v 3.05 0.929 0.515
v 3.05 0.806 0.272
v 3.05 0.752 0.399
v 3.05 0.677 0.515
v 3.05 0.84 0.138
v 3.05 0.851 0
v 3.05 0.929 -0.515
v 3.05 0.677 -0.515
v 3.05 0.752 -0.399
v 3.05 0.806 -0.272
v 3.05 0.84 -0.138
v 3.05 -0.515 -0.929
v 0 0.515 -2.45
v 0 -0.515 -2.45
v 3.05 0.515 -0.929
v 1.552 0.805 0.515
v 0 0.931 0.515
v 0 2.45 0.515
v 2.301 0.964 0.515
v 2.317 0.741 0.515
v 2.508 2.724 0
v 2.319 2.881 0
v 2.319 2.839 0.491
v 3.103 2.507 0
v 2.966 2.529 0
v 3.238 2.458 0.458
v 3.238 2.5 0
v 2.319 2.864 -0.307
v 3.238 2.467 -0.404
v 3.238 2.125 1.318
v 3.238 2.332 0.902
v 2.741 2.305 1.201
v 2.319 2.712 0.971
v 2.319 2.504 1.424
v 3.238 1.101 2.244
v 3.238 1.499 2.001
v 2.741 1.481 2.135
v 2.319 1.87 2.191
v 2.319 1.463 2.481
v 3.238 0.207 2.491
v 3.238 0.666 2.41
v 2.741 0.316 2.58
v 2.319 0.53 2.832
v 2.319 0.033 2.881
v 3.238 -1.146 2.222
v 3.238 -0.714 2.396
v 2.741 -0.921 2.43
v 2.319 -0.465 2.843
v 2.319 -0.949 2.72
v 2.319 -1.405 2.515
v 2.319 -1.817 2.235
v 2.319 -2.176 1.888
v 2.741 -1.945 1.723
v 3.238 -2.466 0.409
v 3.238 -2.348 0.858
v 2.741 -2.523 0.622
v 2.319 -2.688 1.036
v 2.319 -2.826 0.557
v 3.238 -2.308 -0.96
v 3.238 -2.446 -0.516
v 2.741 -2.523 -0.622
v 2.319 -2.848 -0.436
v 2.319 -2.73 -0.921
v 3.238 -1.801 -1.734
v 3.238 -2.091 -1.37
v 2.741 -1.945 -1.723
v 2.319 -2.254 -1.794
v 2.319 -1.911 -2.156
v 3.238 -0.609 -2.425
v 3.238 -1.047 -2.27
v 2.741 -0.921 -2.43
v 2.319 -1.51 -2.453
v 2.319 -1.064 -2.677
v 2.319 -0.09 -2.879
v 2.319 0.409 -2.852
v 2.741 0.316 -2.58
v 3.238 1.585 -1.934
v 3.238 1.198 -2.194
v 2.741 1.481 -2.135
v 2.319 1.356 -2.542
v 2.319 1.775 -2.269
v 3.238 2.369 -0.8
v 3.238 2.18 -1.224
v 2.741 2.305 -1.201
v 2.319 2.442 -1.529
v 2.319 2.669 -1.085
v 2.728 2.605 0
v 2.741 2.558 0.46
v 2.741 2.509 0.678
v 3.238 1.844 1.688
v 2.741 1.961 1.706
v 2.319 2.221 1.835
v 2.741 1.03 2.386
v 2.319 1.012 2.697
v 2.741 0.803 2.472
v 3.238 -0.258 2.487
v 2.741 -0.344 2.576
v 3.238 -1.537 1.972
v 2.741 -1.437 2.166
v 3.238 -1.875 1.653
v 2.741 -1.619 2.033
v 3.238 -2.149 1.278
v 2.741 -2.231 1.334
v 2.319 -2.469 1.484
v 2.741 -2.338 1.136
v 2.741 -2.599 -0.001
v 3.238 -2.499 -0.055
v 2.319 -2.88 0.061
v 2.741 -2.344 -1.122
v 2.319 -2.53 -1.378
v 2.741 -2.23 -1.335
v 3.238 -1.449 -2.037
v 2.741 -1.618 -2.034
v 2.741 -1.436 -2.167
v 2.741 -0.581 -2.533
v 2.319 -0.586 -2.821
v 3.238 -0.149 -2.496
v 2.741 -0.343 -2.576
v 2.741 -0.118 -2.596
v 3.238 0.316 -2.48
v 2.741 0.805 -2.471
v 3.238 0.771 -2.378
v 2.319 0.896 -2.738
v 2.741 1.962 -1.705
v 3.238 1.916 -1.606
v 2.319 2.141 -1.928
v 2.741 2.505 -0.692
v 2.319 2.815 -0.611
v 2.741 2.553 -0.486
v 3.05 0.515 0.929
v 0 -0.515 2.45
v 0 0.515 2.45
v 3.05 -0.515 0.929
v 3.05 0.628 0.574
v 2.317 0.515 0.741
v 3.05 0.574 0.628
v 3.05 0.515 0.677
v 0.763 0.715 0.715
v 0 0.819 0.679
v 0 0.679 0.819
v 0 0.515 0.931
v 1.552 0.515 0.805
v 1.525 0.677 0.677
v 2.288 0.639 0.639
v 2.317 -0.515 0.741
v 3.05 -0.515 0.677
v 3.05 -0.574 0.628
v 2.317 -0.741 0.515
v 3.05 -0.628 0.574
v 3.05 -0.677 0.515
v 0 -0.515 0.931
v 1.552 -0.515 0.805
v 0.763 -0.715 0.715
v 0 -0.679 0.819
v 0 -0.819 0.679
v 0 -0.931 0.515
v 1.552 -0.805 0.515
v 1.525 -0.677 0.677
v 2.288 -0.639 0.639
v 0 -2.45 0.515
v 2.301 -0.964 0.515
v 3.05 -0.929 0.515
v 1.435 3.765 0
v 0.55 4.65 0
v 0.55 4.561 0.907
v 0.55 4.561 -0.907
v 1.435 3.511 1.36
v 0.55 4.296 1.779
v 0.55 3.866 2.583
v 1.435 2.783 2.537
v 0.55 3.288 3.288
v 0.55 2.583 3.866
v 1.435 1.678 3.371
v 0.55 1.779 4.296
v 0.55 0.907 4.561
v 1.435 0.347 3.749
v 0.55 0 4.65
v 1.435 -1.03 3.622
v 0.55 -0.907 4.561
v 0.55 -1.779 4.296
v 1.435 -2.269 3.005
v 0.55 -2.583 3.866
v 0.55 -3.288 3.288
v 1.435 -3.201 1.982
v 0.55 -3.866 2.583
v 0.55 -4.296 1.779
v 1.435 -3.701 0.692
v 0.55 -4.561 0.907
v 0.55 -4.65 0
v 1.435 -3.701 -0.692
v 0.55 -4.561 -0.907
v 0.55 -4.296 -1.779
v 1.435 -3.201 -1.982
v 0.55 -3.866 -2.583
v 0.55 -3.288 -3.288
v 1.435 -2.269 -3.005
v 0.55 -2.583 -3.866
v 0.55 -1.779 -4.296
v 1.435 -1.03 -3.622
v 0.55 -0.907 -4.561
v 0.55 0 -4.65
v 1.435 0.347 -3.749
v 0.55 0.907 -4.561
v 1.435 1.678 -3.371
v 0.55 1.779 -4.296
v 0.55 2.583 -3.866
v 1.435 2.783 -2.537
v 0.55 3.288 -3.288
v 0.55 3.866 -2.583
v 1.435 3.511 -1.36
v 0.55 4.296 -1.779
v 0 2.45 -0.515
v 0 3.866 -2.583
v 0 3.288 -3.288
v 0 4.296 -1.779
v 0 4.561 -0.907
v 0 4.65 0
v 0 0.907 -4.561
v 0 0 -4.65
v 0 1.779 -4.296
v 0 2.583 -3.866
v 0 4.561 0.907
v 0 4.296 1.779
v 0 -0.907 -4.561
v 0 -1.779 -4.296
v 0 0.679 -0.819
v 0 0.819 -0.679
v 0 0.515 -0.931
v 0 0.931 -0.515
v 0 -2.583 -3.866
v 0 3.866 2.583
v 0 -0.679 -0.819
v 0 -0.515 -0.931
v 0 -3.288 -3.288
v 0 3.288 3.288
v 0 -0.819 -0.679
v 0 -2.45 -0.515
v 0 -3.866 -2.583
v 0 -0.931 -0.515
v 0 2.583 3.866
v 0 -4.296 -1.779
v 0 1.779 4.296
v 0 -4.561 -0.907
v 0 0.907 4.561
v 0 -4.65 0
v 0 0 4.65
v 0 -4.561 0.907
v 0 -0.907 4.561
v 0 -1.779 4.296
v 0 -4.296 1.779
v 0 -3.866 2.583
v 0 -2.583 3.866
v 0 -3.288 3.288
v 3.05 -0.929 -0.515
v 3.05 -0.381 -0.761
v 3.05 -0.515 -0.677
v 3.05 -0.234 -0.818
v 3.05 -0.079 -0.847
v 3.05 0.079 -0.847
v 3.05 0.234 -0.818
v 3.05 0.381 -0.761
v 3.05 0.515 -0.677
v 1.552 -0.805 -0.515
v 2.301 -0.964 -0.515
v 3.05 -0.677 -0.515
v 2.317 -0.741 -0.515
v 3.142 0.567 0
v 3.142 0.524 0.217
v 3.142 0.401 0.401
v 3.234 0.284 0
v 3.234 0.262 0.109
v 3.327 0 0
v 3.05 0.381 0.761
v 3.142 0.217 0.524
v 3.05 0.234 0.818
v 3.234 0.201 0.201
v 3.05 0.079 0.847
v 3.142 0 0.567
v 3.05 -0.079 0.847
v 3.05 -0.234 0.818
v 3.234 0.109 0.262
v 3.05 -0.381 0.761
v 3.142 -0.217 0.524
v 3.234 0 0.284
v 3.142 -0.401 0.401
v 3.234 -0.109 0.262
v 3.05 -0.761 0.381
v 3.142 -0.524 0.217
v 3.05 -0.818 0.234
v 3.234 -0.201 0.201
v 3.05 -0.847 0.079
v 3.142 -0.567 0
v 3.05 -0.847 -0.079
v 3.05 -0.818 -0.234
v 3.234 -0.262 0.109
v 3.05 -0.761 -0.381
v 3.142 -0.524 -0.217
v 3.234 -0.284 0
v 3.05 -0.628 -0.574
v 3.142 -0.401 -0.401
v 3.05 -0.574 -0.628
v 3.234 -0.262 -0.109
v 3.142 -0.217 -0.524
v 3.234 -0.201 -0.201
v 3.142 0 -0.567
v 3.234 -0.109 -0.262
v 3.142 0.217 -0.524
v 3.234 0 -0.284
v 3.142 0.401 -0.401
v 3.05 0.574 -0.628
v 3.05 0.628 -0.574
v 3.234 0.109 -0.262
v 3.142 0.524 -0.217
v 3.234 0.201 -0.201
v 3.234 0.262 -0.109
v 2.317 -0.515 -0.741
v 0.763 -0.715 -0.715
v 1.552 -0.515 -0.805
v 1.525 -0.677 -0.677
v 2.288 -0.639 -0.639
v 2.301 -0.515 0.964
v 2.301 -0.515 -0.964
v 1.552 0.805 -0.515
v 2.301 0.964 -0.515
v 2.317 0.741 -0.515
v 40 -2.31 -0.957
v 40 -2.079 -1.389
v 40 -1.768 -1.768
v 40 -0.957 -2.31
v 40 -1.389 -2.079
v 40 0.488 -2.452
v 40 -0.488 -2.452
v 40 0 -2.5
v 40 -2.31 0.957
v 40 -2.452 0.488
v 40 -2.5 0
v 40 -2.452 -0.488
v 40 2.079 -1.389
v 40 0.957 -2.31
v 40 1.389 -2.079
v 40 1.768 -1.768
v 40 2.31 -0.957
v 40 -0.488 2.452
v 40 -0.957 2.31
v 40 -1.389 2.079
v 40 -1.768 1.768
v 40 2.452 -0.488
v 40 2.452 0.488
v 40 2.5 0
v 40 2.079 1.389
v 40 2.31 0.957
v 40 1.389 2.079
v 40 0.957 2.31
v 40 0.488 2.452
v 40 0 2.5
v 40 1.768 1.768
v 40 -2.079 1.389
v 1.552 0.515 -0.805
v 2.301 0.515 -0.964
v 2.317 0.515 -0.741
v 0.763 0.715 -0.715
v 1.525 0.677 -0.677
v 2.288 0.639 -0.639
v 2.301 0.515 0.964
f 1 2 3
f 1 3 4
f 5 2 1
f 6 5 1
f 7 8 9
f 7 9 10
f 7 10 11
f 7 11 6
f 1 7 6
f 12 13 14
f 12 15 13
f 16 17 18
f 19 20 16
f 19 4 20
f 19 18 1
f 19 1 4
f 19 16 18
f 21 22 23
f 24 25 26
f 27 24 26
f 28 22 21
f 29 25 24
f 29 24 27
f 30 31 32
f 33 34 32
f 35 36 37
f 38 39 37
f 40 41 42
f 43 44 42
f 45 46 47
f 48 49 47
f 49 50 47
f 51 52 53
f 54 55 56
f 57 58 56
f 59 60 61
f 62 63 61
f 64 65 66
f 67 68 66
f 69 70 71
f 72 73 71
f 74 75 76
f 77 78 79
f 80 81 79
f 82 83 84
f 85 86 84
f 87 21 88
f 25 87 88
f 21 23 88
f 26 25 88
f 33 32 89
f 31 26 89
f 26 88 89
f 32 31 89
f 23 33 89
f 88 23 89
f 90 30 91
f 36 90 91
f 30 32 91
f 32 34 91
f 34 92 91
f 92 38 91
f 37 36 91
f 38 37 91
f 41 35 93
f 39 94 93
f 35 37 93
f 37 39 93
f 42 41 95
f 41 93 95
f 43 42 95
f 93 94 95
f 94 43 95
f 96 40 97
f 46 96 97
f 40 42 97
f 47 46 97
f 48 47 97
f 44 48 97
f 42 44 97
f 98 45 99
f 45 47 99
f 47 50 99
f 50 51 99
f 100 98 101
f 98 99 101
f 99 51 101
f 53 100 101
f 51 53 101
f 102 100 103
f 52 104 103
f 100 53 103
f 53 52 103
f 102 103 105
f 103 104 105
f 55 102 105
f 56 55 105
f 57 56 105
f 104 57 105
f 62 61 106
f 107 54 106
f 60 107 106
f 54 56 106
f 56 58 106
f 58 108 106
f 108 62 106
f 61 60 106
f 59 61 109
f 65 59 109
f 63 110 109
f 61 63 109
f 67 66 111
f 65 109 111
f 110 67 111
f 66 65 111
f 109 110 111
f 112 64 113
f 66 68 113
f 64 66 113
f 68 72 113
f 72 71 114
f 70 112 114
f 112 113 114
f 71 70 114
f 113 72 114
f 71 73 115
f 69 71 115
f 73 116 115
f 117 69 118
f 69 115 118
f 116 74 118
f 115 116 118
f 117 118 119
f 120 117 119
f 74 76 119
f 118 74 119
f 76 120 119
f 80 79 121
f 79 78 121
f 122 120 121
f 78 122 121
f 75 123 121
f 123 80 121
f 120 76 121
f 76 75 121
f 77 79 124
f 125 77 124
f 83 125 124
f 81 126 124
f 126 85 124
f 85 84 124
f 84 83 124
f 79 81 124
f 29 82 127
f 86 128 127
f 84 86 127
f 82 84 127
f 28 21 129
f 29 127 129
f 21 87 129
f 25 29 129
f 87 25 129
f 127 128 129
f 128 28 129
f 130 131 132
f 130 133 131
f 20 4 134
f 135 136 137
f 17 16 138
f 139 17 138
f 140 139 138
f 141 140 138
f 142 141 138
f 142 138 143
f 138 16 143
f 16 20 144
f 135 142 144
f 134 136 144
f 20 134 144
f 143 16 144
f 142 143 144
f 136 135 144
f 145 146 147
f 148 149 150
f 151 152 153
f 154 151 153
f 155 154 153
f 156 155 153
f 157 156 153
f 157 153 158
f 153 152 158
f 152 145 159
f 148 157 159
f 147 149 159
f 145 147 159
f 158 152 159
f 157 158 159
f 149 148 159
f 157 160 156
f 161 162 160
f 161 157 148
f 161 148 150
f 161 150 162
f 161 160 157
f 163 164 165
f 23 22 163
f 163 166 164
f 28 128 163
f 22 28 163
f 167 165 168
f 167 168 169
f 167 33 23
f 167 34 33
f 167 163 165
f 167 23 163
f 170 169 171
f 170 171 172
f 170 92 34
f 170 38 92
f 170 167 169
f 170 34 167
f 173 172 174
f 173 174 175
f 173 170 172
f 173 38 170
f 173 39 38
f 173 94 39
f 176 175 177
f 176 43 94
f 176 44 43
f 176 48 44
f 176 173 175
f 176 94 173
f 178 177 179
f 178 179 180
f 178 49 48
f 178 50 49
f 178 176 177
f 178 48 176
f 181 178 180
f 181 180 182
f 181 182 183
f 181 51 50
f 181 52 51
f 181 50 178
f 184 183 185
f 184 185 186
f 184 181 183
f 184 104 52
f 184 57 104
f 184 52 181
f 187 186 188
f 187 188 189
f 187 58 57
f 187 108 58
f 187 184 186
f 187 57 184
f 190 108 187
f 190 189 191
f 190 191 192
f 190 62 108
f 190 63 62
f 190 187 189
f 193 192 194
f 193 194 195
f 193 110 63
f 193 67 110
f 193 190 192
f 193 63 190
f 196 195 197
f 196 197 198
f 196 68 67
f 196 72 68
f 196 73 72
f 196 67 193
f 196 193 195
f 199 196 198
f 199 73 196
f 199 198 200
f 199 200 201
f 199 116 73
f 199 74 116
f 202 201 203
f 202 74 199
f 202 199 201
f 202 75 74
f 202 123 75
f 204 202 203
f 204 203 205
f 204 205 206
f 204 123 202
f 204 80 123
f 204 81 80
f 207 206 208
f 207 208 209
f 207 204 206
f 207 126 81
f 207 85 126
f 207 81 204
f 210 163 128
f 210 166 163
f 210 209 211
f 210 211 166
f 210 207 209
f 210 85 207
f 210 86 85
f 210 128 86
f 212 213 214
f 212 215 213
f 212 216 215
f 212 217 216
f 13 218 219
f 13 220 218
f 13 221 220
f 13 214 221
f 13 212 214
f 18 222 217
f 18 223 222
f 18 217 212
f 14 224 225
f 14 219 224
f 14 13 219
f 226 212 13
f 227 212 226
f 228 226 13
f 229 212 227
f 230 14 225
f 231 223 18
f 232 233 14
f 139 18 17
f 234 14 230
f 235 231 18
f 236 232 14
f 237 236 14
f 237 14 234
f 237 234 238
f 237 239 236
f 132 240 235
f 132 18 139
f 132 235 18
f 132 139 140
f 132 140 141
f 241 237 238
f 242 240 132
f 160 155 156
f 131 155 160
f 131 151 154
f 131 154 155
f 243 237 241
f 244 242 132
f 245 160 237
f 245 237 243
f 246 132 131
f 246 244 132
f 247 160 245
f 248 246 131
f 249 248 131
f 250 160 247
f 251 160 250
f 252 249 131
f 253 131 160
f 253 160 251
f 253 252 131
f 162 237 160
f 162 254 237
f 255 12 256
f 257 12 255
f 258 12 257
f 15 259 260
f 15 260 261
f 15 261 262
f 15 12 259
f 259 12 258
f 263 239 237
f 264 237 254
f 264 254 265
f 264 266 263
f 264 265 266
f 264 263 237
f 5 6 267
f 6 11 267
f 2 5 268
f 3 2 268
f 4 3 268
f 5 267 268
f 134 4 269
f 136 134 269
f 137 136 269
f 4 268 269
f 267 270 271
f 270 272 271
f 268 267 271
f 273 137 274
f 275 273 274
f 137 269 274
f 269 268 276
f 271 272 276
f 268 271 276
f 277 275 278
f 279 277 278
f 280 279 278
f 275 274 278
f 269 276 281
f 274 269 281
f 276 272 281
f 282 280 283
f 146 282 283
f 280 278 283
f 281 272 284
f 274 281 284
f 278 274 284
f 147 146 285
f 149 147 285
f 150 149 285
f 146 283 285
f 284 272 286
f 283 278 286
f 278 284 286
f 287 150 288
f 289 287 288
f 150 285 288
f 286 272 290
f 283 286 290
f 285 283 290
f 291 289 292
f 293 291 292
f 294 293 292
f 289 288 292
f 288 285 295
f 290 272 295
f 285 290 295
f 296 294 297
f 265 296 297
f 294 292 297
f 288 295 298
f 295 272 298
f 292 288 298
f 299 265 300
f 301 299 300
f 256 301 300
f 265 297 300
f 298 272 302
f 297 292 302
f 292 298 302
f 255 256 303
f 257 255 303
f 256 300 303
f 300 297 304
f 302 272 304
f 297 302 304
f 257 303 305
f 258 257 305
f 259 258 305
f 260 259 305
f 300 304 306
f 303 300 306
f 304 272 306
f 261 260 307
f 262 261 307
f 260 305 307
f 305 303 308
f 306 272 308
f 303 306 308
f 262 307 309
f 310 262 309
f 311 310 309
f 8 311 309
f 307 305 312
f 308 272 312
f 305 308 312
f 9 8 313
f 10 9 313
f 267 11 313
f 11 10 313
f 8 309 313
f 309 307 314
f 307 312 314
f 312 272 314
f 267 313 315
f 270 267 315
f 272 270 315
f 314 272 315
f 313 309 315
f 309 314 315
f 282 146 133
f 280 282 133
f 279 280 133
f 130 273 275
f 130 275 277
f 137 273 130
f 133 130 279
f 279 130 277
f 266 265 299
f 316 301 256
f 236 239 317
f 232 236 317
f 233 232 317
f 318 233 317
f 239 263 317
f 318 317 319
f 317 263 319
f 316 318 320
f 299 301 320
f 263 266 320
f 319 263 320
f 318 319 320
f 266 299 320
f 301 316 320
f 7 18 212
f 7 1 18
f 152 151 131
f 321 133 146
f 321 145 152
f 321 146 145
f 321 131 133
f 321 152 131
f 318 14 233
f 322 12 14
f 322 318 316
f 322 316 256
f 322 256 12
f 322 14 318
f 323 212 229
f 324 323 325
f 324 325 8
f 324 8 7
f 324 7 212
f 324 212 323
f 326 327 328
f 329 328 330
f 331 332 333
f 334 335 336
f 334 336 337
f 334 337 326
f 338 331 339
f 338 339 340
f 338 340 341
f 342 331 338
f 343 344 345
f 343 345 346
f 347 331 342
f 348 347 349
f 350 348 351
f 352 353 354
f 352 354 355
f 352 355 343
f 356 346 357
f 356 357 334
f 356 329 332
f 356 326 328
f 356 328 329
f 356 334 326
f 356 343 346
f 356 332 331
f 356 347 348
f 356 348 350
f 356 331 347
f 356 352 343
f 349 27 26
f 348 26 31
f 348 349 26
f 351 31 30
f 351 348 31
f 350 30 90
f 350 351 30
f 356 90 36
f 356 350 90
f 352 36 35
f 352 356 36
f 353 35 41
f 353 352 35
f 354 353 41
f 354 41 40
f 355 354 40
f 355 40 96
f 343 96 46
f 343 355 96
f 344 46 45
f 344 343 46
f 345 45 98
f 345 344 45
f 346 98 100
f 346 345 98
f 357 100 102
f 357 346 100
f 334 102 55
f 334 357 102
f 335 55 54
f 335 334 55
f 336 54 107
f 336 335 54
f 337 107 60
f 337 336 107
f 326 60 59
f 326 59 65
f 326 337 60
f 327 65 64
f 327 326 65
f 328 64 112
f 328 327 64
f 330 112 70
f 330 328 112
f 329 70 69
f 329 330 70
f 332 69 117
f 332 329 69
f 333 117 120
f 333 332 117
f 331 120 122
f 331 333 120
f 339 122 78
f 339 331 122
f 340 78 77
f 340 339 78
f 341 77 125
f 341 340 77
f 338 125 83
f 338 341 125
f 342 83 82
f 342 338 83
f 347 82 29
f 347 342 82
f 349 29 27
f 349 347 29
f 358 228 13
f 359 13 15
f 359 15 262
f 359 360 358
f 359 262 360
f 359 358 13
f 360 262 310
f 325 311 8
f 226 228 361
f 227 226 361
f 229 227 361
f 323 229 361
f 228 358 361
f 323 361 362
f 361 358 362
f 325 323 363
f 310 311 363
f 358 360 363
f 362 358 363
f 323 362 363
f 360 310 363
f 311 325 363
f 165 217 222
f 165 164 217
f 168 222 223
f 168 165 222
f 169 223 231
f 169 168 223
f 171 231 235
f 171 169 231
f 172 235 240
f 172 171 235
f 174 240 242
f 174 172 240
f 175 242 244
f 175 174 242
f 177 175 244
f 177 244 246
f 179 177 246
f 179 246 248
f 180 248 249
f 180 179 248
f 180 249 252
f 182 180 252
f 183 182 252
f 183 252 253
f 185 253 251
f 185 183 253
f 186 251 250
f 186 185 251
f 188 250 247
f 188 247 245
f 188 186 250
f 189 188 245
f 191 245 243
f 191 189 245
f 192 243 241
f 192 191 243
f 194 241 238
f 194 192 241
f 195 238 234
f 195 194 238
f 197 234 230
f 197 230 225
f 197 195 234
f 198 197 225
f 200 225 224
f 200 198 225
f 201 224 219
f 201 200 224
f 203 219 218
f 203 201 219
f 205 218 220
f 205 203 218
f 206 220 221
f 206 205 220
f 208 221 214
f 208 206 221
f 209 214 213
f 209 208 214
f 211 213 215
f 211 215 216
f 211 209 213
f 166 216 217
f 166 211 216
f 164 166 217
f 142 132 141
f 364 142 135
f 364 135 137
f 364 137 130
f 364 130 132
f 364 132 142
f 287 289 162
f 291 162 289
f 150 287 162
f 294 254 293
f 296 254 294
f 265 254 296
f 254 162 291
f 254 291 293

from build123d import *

# Parameters (mm, degrees)
FILLET1_R    = 1.3
SKETCH3_W    = 1.03
SKETCH3_H    = 4.9
SKETCH4_W    = 1.03
SKETCH4_H    = 1.858652296
RECPAT_COUNT = 2
RECPAT_ANGLE = 90


with BuildPart() as part:
    # BodySke → Base-Revolve (revolve)
    with BuildSketch(Plane.XY):
        Polygon((0, 0), (0, 4.65), (0.55, 4.65), (2.7, 2.5), (40, 2.5), (40, 0), align=None)
    revolve(axis=Axis((-6.35, 0, 0), (1, 0, 0)))

    # Fillet1
    fillet1_edges = [part.edges().sort_by_distance(p)[0] for p in [
        (2.7, -2.5, 0),
    ]]
    fillet(fillet1_edges, radius=FILLET1_R)

    # Sketch3 → Recess section 0
    with BuildSketch(Plane.ZY):
        Rectangle(SKETCH3_W, SKETCH3_H)
    # Sketch4 → Recess section 1
    with BuildSketch(Plane.ZY.offset(-3.05)):
        Rectangle(SKETCH4_W, SKETCH4_H)
    recess = loft(mode=Mode.SUBTRACT)

    # RecPat: Recess ×2 about axis
    recpat_axis = Axis((0, 0, 0), (1, 0, 0))
    for i in range(1, RECPAT_COUNT):
        add(recess.rotate(recpat_axis, i * RECPAT_ANGLE / (RECPAT_COUNT - 1)), mode=Mode.SUBTRACT)

    # RecCorSke → RecessCore (revolve, cut)
    with BuildSketch(Plane.XY):
        Polygon((0, 0), (0, 1.064276776), (3.05, 0.851), (3.326506661, 0), align=None)
    revolve(axis=Axis((-3.175, 0, 0), (1, 0, 0)), mode=Mode.SUBTRACT)


solid = part.part
